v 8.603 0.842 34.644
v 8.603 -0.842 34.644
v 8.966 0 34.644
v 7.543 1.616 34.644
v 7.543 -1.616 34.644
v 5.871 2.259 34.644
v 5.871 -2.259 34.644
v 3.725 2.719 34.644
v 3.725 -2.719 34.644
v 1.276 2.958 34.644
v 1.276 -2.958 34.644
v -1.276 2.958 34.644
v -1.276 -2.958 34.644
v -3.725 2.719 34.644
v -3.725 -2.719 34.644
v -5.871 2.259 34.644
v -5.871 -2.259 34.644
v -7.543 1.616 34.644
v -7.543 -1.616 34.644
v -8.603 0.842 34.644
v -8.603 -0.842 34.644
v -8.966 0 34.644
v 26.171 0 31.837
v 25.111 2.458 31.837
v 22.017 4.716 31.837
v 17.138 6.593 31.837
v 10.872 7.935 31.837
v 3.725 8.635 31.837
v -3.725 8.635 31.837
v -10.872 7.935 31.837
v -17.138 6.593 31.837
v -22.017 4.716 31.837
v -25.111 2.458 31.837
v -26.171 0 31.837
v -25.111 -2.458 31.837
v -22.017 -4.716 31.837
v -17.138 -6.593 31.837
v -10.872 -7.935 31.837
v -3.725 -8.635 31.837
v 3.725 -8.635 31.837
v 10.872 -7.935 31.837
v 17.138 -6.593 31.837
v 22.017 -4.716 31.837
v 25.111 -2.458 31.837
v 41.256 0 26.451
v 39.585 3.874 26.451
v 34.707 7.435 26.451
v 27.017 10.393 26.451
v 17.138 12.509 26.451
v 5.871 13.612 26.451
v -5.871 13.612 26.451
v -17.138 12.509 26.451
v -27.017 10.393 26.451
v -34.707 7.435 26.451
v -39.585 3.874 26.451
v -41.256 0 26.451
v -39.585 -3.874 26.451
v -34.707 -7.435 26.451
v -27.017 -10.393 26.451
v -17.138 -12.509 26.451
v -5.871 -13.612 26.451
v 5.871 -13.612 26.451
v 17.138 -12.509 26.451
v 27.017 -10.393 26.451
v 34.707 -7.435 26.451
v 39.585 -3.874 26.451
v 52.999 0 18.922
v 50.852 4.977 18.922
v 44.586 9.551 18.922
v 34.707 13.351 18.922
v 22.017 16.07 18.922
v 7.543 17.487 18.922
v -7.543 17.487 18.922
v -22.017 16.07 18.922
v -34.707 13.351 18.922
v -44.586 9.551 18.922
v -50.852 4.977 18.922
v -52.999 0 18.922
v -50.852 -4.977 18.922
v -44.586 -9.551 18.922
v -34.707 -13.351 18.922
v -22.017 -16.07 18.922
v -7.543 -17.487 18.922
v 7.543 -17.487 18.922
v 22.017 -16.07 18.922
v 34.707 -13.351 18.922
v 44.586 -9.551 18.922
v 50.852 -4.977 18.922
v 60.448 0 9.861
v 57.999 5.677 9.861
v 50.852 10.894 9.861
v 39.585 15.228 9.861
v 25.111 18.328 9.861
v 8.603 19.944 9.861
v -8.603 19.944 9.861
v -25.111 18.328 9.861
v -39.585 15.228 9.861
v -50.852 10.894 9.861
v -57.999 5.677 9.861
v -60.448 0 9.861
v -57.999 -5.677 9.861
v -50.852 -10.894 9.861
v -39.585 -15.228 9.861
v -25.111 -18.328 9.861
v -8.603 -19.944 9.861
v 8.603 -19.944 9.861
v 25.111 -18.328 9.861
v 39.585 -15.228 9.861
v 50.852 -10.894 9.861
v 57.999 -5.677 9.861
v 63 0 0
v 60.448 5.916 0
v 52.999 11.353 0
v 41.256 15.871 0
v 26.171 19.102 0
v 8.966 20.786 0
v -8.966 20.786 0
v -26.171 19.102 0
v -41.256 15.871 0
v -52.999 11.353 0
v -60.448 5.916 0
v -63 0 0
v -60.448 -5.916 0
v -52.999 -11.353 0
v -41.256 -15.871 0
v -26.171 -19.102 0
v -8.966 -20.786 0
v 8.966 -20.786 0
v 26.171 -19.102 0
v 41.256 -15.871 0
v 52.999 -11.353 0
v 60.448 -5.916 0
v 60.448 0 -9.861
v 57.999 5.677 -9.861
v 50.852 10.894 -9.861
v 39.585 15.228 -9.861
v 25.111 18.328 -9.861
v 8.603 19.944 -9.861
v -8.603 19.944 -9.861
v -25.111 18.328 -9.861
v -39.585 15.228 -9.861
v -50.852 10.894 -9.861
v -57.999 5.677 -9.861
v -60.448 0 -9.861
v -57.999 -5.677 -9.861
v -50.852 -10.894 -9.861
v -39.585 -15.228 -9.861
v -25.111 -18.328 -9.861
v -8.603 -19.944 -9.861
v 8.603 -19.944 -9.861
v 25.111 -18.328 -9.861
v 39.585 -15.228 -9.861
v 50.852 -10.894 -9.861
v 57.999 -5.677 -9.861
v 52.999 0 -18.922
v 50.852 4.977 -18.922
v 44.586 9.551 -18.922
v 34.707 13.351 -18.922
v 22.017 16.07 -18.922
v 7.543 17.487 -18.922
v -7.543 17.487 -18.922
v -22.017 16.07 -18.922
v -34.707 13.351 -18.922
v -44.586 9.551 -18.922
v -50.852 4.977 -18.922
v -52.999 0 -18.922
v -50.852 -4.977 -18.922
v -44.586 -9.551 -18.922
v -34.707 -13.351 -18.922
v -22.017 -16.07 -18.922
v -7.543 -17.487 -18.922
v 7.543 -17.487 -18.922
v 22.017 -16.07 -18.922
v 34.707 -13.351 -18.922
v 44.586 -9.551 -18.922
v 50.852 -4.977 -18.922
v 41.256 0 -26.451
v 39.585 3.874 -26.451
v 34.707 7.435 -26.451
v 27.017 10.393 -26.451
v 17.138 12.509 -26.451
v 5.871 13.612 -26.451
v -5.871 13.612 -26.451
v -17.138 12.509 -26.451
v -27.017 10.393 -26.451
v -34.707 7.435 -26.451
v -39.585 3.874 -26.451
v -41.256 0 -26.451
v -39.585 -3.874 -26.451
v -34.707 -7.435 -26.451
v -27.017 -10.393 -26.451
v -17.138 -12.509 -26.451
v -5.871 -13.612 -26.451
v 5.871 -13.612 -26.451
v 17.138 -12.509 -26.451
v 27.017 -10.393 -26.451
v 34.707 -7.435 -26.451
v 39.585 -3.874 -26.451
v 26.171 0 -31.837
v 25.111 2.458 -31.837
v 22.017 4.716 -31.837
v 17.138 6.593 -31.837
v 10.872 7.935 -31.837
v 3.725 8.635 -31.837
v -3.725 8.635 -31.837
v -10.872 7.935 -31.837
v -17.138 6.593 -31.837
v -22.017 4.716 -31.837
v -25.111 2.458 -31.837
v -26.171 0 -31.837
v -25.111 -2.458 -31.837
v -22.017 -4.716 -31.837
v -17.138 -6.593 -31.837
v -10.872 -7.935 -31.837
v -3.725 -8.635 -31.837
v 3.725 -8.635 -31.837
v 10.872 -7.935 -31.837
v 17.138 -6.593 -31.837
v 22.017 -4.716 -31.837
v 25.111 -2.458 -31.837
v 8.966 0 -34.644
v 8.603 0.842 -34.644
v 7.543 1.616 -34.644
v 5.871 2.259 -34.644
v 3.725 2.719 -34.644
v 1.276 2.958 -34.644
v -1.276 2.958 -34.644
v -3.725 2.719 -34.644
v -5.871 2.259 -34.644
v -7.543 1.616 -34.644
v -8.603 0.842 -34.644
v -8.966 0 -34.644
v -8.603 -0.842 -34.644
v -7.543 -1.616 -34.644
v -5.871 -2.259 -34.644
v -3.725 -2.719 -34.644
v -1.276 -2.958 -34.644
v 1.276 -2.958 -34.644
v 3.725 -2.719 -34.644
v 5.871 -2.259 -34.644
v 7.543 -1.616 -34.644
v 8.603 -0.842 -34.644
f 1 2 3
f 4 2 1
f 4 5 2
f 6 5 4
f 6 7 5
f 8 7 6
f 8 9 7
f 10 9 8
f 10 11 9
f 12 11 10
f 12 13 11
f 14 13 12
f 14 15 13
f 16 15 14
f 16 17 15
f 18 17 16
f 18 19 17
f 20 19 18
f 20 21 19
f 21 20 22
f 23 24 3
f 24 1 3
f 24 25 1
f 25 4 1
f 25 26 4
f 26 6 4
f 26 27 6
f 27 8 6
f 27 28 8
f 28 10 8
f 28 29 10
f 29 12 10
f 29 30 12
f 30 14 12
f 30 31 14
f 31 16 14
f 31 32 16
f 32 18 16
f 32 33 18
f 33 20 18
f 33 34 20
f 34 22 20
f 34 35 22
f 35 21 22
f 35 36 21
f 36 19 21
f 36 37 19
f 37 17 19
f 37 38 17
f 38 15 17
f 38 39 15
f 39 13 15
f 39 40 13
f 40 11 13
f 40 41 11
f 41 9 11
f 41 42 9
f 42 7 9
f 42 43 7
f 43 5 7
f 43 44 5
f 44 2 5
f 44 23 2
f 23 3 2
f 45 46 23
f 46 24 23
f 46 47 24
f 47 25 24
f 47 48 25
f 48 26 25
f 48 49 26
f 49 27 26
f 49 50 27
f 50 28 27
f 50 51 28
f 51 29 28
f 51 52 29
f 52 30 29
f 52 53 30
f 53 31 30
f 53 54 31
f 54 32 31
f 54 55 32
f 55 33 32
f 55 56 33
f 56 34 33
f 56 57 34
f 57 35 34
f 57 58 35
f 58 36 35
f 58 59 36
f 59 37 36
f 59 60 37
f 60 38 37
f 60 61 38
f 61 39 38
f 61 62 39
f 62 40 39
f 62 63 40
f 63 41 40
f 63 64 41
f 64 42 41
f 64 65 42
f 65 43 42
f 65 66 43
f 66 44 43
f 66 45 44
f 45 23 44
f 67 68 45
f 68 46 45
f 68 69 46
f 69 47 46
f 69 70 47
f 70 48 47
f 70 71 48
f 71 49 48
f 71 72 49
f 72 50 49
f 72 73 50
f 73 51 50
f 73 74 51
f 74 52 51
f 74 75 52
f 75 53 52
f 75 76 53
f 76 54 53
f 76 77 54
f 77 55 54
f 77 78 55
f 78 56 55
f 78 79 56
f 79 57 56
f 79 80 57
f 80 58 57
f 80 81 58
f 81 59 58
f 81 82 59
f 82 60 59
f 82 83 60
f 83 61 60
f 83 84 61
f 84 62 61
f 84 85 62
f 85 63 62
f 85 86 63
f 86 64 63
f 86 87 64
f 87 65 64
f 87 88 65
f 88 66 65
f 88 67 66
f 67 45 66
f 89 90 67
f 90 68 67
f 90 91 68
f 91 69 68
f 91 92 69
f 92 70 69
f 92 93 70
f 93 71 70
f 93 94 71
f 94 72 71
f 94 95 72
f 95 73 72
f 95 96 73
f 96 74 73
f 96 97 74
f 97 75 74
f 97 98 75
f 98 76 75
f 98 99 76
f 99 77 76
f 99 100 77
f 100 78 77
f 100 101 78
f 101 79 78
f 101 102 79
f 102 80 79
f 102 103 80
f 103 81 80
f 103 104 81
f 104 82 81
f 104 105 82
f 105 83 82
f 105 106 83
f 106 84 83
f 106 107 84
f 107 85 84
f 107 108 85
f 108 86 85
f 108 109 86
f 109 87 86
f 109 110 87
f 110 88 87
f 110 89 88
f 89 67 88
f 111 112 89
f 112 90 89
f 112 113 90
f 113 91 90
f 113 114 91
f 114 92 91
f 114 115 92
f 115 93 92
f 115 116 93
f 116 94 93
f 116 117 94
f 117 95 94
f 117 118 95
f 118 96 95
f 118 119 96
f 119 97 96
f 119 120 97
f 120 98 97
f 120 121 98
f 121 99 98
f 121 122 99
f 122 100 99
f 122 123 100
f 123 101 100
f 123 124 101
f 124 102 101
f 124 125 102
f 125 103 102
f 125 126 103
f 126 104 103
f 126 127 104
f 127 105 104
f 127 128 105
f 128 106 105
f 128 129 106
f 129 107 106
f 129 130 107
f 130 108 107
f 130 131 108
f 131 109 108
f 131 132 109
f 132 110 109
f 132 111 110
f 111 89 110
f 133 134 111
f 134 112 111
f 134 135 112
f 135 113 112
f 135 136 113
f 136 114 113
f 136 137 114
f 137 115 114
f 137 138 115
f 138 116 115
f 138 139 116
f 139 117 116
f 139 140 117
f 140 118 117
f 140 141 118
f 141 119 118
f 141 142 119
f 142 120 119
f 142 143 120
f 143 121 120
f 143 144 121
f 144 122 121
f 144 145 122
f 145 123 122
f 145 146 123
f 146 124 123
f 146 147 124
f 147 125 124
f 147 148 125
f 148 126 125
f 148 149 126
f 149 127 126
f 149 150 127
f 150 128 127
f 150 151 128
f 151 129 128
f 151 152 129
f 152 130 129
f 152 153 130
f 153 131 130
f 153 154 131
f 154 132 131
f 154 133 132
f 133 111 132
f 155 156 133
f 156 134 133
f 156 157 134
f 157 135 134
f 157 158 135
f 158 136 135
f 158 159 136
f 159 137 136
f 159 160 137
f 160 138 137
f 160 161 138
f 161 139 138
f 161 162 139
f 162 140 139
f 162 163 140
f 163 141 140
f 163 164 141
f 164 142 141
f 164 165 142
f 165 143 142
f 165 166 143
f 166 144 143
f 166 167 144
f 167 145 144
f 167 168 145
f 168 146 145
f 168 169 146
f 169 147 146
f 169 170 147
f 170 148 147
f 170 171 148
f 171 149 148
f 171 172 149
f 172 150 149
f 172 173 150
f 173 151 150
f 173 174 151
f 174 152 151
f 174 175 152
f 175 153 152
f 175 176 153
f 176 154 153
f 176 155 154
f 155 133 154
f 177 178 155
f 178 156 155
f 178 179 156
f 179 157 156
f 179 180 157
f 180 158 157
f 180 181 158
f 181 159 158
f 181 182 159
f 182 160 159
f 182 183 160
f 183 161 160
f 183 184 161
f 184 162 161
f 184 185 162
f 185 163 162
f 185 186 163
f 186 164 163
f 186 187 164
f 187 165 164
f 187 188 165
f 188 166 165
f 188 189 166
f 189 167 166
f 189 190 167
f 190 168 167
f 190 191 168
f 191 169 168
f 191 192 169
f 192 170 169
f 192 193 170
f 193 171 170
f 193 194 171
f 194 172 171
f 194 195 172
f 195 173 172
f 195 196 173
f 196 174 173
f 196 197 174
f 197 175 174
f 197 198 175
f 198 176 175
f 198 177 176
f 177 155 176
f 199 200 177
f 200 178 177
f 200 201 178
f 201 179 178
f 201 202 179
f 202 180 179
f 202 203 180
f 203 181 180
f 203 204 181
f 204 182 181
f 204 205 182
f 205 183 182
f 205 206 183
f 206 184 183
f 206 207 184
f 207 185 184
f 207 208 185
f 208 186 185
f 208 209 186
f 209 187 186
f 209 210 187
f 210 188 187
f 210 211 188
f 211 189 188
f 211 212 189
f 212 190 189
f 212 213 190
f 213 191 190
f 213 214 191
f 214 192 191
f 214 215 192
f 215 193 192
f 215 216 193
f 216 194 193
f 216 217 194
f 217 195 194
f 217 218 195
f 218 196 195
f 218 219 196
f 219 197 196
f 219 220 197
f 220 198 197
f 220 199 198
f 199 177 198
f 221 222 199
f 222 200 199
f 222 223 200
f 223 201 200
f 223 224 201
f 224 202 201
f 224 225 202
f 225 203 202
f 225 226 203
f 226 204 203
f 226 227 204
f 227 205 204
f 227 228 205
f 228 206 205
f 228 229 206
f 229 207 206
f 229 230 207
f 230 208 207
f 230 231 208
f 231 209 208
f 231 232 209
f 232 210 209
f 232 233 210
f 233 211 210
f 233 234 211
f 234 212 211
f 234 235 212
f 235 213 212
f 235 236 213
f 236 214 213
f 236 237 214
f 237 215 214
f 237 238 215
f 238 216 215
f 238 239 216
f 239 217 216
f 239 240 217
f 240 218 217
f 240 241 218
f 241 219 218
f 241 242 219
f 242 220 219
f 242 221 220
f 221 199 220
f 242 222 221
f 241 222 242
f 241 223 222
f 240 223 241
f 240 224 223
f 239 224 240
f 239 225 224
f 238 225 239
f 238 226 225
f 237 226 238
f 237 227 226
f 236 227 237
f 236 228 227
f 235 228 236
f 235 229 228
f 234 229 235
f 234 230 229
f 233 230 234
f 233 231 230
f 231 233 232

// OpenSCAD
// Generated by SolidPython 1.0.1 on 2020-07-29 00:46:48


scale(v = [9, 3, 5]) {
	sphere(r = 7);
}
/***********************************************
*********      SolidPython code:      **********
************************************************
 
# import packages: SolidPython
from solid import *
from solid.utils import *
from itertools import chain, combinations, permutations


class Resize:

    def __init__(self, scad_file):
        self.scad_file = scad_file
        #self.scad_file = import_scad(scad_file)
        # cone/cylinder param:
        self.r1 = 0
        self.r2 = 0
        self.h = 0
        # rectangular prism param:
        self.w = 0
        self.l = 0
        # ellipse param:
        self.r = 0

    # import OpenScad code (file name corresponds to shape)


    # classify shape + parameters
    def assign(self, param1, param2, param3):
        if self.scad_file == 'cone.scad':
            self.r1 = param1
            self.r2 = param2
            self.h = param3
        elif self.scad_file == 'cylinder.scad':
            self.r1 = param1
            self.r2 = param2
            self.h = param3
        elif self.scad_file == 'rectangularPrism.scad':
            self.h = param1
            self.l = param2
            self.w = param3
        else:
            self.r = param1
            self.h = param2

    # resize parameters
    def iterate(self):
        x = range(3, 20, 2)
        i = 1
        if self.scad_file == 'cone.scad':
            tempList = list(permutations(x, 2))
            for temp in tempList:
                param1 = temp[0]
                param2 = temp[1]
                filepath = 'produced_scad_files/' + 'cone' + str(param1) + '_' + str(param2) + '_' + '.scad'
                scad_render_to_file(cylinder(h=param1, r1=param2, r2=0), filepath)

        elif self.scad_file == 'cylinder.scad':
            tempList = list(permutations(x, 3))
            for temp in tempList:
                param1 = temp[0]
                param2 = temp[1]
                filepath = 'produced_scad_files/' + 'cylinder' + str(param1) + '_' + str(param2) + '_' + '.scad'
                scad_render_to_file(cylinder(h=param1, r1=param2, r2=param2), filepath)

        elif self.scad_file == 'rectangularPrism.scad':
            tempList = list(permutations(x, 3))
            for temp in tempList:
                param1 = temp[0]
                param2 = temp[1]
                param3 = temp[2]
                filepath = 'produced_scad_files/' + 'rectangularPrism' + str(param1) + '_' + str(param2) + '_' + str(
                    param3) + '.scad'
                scad_render_to_file(cube(size=(param1, param2, param3)), filepath)

        elif self.scad_file == 'ellipse.scad':
            tempList = list(permutations(x, 4))
            for temp in tempList:
                param1 = temp[0]
                param2 = temp[1]
                param3 = temp[2]
                param4 = temp[3]
                filepath = 'produced_scad_files/' + 'ellipse' + str(param1) + '_' + str(param2) + '_' + str(param3) + '_' + str(param4) + '.scad'
                scad_render_to_file(scale([param1, param2, param3])(sphere(r=param4)), filepath)

    def render_to_scadfile(self):
        scad_render_to_file(scad, 'example.scad') 
 
************************************************/
